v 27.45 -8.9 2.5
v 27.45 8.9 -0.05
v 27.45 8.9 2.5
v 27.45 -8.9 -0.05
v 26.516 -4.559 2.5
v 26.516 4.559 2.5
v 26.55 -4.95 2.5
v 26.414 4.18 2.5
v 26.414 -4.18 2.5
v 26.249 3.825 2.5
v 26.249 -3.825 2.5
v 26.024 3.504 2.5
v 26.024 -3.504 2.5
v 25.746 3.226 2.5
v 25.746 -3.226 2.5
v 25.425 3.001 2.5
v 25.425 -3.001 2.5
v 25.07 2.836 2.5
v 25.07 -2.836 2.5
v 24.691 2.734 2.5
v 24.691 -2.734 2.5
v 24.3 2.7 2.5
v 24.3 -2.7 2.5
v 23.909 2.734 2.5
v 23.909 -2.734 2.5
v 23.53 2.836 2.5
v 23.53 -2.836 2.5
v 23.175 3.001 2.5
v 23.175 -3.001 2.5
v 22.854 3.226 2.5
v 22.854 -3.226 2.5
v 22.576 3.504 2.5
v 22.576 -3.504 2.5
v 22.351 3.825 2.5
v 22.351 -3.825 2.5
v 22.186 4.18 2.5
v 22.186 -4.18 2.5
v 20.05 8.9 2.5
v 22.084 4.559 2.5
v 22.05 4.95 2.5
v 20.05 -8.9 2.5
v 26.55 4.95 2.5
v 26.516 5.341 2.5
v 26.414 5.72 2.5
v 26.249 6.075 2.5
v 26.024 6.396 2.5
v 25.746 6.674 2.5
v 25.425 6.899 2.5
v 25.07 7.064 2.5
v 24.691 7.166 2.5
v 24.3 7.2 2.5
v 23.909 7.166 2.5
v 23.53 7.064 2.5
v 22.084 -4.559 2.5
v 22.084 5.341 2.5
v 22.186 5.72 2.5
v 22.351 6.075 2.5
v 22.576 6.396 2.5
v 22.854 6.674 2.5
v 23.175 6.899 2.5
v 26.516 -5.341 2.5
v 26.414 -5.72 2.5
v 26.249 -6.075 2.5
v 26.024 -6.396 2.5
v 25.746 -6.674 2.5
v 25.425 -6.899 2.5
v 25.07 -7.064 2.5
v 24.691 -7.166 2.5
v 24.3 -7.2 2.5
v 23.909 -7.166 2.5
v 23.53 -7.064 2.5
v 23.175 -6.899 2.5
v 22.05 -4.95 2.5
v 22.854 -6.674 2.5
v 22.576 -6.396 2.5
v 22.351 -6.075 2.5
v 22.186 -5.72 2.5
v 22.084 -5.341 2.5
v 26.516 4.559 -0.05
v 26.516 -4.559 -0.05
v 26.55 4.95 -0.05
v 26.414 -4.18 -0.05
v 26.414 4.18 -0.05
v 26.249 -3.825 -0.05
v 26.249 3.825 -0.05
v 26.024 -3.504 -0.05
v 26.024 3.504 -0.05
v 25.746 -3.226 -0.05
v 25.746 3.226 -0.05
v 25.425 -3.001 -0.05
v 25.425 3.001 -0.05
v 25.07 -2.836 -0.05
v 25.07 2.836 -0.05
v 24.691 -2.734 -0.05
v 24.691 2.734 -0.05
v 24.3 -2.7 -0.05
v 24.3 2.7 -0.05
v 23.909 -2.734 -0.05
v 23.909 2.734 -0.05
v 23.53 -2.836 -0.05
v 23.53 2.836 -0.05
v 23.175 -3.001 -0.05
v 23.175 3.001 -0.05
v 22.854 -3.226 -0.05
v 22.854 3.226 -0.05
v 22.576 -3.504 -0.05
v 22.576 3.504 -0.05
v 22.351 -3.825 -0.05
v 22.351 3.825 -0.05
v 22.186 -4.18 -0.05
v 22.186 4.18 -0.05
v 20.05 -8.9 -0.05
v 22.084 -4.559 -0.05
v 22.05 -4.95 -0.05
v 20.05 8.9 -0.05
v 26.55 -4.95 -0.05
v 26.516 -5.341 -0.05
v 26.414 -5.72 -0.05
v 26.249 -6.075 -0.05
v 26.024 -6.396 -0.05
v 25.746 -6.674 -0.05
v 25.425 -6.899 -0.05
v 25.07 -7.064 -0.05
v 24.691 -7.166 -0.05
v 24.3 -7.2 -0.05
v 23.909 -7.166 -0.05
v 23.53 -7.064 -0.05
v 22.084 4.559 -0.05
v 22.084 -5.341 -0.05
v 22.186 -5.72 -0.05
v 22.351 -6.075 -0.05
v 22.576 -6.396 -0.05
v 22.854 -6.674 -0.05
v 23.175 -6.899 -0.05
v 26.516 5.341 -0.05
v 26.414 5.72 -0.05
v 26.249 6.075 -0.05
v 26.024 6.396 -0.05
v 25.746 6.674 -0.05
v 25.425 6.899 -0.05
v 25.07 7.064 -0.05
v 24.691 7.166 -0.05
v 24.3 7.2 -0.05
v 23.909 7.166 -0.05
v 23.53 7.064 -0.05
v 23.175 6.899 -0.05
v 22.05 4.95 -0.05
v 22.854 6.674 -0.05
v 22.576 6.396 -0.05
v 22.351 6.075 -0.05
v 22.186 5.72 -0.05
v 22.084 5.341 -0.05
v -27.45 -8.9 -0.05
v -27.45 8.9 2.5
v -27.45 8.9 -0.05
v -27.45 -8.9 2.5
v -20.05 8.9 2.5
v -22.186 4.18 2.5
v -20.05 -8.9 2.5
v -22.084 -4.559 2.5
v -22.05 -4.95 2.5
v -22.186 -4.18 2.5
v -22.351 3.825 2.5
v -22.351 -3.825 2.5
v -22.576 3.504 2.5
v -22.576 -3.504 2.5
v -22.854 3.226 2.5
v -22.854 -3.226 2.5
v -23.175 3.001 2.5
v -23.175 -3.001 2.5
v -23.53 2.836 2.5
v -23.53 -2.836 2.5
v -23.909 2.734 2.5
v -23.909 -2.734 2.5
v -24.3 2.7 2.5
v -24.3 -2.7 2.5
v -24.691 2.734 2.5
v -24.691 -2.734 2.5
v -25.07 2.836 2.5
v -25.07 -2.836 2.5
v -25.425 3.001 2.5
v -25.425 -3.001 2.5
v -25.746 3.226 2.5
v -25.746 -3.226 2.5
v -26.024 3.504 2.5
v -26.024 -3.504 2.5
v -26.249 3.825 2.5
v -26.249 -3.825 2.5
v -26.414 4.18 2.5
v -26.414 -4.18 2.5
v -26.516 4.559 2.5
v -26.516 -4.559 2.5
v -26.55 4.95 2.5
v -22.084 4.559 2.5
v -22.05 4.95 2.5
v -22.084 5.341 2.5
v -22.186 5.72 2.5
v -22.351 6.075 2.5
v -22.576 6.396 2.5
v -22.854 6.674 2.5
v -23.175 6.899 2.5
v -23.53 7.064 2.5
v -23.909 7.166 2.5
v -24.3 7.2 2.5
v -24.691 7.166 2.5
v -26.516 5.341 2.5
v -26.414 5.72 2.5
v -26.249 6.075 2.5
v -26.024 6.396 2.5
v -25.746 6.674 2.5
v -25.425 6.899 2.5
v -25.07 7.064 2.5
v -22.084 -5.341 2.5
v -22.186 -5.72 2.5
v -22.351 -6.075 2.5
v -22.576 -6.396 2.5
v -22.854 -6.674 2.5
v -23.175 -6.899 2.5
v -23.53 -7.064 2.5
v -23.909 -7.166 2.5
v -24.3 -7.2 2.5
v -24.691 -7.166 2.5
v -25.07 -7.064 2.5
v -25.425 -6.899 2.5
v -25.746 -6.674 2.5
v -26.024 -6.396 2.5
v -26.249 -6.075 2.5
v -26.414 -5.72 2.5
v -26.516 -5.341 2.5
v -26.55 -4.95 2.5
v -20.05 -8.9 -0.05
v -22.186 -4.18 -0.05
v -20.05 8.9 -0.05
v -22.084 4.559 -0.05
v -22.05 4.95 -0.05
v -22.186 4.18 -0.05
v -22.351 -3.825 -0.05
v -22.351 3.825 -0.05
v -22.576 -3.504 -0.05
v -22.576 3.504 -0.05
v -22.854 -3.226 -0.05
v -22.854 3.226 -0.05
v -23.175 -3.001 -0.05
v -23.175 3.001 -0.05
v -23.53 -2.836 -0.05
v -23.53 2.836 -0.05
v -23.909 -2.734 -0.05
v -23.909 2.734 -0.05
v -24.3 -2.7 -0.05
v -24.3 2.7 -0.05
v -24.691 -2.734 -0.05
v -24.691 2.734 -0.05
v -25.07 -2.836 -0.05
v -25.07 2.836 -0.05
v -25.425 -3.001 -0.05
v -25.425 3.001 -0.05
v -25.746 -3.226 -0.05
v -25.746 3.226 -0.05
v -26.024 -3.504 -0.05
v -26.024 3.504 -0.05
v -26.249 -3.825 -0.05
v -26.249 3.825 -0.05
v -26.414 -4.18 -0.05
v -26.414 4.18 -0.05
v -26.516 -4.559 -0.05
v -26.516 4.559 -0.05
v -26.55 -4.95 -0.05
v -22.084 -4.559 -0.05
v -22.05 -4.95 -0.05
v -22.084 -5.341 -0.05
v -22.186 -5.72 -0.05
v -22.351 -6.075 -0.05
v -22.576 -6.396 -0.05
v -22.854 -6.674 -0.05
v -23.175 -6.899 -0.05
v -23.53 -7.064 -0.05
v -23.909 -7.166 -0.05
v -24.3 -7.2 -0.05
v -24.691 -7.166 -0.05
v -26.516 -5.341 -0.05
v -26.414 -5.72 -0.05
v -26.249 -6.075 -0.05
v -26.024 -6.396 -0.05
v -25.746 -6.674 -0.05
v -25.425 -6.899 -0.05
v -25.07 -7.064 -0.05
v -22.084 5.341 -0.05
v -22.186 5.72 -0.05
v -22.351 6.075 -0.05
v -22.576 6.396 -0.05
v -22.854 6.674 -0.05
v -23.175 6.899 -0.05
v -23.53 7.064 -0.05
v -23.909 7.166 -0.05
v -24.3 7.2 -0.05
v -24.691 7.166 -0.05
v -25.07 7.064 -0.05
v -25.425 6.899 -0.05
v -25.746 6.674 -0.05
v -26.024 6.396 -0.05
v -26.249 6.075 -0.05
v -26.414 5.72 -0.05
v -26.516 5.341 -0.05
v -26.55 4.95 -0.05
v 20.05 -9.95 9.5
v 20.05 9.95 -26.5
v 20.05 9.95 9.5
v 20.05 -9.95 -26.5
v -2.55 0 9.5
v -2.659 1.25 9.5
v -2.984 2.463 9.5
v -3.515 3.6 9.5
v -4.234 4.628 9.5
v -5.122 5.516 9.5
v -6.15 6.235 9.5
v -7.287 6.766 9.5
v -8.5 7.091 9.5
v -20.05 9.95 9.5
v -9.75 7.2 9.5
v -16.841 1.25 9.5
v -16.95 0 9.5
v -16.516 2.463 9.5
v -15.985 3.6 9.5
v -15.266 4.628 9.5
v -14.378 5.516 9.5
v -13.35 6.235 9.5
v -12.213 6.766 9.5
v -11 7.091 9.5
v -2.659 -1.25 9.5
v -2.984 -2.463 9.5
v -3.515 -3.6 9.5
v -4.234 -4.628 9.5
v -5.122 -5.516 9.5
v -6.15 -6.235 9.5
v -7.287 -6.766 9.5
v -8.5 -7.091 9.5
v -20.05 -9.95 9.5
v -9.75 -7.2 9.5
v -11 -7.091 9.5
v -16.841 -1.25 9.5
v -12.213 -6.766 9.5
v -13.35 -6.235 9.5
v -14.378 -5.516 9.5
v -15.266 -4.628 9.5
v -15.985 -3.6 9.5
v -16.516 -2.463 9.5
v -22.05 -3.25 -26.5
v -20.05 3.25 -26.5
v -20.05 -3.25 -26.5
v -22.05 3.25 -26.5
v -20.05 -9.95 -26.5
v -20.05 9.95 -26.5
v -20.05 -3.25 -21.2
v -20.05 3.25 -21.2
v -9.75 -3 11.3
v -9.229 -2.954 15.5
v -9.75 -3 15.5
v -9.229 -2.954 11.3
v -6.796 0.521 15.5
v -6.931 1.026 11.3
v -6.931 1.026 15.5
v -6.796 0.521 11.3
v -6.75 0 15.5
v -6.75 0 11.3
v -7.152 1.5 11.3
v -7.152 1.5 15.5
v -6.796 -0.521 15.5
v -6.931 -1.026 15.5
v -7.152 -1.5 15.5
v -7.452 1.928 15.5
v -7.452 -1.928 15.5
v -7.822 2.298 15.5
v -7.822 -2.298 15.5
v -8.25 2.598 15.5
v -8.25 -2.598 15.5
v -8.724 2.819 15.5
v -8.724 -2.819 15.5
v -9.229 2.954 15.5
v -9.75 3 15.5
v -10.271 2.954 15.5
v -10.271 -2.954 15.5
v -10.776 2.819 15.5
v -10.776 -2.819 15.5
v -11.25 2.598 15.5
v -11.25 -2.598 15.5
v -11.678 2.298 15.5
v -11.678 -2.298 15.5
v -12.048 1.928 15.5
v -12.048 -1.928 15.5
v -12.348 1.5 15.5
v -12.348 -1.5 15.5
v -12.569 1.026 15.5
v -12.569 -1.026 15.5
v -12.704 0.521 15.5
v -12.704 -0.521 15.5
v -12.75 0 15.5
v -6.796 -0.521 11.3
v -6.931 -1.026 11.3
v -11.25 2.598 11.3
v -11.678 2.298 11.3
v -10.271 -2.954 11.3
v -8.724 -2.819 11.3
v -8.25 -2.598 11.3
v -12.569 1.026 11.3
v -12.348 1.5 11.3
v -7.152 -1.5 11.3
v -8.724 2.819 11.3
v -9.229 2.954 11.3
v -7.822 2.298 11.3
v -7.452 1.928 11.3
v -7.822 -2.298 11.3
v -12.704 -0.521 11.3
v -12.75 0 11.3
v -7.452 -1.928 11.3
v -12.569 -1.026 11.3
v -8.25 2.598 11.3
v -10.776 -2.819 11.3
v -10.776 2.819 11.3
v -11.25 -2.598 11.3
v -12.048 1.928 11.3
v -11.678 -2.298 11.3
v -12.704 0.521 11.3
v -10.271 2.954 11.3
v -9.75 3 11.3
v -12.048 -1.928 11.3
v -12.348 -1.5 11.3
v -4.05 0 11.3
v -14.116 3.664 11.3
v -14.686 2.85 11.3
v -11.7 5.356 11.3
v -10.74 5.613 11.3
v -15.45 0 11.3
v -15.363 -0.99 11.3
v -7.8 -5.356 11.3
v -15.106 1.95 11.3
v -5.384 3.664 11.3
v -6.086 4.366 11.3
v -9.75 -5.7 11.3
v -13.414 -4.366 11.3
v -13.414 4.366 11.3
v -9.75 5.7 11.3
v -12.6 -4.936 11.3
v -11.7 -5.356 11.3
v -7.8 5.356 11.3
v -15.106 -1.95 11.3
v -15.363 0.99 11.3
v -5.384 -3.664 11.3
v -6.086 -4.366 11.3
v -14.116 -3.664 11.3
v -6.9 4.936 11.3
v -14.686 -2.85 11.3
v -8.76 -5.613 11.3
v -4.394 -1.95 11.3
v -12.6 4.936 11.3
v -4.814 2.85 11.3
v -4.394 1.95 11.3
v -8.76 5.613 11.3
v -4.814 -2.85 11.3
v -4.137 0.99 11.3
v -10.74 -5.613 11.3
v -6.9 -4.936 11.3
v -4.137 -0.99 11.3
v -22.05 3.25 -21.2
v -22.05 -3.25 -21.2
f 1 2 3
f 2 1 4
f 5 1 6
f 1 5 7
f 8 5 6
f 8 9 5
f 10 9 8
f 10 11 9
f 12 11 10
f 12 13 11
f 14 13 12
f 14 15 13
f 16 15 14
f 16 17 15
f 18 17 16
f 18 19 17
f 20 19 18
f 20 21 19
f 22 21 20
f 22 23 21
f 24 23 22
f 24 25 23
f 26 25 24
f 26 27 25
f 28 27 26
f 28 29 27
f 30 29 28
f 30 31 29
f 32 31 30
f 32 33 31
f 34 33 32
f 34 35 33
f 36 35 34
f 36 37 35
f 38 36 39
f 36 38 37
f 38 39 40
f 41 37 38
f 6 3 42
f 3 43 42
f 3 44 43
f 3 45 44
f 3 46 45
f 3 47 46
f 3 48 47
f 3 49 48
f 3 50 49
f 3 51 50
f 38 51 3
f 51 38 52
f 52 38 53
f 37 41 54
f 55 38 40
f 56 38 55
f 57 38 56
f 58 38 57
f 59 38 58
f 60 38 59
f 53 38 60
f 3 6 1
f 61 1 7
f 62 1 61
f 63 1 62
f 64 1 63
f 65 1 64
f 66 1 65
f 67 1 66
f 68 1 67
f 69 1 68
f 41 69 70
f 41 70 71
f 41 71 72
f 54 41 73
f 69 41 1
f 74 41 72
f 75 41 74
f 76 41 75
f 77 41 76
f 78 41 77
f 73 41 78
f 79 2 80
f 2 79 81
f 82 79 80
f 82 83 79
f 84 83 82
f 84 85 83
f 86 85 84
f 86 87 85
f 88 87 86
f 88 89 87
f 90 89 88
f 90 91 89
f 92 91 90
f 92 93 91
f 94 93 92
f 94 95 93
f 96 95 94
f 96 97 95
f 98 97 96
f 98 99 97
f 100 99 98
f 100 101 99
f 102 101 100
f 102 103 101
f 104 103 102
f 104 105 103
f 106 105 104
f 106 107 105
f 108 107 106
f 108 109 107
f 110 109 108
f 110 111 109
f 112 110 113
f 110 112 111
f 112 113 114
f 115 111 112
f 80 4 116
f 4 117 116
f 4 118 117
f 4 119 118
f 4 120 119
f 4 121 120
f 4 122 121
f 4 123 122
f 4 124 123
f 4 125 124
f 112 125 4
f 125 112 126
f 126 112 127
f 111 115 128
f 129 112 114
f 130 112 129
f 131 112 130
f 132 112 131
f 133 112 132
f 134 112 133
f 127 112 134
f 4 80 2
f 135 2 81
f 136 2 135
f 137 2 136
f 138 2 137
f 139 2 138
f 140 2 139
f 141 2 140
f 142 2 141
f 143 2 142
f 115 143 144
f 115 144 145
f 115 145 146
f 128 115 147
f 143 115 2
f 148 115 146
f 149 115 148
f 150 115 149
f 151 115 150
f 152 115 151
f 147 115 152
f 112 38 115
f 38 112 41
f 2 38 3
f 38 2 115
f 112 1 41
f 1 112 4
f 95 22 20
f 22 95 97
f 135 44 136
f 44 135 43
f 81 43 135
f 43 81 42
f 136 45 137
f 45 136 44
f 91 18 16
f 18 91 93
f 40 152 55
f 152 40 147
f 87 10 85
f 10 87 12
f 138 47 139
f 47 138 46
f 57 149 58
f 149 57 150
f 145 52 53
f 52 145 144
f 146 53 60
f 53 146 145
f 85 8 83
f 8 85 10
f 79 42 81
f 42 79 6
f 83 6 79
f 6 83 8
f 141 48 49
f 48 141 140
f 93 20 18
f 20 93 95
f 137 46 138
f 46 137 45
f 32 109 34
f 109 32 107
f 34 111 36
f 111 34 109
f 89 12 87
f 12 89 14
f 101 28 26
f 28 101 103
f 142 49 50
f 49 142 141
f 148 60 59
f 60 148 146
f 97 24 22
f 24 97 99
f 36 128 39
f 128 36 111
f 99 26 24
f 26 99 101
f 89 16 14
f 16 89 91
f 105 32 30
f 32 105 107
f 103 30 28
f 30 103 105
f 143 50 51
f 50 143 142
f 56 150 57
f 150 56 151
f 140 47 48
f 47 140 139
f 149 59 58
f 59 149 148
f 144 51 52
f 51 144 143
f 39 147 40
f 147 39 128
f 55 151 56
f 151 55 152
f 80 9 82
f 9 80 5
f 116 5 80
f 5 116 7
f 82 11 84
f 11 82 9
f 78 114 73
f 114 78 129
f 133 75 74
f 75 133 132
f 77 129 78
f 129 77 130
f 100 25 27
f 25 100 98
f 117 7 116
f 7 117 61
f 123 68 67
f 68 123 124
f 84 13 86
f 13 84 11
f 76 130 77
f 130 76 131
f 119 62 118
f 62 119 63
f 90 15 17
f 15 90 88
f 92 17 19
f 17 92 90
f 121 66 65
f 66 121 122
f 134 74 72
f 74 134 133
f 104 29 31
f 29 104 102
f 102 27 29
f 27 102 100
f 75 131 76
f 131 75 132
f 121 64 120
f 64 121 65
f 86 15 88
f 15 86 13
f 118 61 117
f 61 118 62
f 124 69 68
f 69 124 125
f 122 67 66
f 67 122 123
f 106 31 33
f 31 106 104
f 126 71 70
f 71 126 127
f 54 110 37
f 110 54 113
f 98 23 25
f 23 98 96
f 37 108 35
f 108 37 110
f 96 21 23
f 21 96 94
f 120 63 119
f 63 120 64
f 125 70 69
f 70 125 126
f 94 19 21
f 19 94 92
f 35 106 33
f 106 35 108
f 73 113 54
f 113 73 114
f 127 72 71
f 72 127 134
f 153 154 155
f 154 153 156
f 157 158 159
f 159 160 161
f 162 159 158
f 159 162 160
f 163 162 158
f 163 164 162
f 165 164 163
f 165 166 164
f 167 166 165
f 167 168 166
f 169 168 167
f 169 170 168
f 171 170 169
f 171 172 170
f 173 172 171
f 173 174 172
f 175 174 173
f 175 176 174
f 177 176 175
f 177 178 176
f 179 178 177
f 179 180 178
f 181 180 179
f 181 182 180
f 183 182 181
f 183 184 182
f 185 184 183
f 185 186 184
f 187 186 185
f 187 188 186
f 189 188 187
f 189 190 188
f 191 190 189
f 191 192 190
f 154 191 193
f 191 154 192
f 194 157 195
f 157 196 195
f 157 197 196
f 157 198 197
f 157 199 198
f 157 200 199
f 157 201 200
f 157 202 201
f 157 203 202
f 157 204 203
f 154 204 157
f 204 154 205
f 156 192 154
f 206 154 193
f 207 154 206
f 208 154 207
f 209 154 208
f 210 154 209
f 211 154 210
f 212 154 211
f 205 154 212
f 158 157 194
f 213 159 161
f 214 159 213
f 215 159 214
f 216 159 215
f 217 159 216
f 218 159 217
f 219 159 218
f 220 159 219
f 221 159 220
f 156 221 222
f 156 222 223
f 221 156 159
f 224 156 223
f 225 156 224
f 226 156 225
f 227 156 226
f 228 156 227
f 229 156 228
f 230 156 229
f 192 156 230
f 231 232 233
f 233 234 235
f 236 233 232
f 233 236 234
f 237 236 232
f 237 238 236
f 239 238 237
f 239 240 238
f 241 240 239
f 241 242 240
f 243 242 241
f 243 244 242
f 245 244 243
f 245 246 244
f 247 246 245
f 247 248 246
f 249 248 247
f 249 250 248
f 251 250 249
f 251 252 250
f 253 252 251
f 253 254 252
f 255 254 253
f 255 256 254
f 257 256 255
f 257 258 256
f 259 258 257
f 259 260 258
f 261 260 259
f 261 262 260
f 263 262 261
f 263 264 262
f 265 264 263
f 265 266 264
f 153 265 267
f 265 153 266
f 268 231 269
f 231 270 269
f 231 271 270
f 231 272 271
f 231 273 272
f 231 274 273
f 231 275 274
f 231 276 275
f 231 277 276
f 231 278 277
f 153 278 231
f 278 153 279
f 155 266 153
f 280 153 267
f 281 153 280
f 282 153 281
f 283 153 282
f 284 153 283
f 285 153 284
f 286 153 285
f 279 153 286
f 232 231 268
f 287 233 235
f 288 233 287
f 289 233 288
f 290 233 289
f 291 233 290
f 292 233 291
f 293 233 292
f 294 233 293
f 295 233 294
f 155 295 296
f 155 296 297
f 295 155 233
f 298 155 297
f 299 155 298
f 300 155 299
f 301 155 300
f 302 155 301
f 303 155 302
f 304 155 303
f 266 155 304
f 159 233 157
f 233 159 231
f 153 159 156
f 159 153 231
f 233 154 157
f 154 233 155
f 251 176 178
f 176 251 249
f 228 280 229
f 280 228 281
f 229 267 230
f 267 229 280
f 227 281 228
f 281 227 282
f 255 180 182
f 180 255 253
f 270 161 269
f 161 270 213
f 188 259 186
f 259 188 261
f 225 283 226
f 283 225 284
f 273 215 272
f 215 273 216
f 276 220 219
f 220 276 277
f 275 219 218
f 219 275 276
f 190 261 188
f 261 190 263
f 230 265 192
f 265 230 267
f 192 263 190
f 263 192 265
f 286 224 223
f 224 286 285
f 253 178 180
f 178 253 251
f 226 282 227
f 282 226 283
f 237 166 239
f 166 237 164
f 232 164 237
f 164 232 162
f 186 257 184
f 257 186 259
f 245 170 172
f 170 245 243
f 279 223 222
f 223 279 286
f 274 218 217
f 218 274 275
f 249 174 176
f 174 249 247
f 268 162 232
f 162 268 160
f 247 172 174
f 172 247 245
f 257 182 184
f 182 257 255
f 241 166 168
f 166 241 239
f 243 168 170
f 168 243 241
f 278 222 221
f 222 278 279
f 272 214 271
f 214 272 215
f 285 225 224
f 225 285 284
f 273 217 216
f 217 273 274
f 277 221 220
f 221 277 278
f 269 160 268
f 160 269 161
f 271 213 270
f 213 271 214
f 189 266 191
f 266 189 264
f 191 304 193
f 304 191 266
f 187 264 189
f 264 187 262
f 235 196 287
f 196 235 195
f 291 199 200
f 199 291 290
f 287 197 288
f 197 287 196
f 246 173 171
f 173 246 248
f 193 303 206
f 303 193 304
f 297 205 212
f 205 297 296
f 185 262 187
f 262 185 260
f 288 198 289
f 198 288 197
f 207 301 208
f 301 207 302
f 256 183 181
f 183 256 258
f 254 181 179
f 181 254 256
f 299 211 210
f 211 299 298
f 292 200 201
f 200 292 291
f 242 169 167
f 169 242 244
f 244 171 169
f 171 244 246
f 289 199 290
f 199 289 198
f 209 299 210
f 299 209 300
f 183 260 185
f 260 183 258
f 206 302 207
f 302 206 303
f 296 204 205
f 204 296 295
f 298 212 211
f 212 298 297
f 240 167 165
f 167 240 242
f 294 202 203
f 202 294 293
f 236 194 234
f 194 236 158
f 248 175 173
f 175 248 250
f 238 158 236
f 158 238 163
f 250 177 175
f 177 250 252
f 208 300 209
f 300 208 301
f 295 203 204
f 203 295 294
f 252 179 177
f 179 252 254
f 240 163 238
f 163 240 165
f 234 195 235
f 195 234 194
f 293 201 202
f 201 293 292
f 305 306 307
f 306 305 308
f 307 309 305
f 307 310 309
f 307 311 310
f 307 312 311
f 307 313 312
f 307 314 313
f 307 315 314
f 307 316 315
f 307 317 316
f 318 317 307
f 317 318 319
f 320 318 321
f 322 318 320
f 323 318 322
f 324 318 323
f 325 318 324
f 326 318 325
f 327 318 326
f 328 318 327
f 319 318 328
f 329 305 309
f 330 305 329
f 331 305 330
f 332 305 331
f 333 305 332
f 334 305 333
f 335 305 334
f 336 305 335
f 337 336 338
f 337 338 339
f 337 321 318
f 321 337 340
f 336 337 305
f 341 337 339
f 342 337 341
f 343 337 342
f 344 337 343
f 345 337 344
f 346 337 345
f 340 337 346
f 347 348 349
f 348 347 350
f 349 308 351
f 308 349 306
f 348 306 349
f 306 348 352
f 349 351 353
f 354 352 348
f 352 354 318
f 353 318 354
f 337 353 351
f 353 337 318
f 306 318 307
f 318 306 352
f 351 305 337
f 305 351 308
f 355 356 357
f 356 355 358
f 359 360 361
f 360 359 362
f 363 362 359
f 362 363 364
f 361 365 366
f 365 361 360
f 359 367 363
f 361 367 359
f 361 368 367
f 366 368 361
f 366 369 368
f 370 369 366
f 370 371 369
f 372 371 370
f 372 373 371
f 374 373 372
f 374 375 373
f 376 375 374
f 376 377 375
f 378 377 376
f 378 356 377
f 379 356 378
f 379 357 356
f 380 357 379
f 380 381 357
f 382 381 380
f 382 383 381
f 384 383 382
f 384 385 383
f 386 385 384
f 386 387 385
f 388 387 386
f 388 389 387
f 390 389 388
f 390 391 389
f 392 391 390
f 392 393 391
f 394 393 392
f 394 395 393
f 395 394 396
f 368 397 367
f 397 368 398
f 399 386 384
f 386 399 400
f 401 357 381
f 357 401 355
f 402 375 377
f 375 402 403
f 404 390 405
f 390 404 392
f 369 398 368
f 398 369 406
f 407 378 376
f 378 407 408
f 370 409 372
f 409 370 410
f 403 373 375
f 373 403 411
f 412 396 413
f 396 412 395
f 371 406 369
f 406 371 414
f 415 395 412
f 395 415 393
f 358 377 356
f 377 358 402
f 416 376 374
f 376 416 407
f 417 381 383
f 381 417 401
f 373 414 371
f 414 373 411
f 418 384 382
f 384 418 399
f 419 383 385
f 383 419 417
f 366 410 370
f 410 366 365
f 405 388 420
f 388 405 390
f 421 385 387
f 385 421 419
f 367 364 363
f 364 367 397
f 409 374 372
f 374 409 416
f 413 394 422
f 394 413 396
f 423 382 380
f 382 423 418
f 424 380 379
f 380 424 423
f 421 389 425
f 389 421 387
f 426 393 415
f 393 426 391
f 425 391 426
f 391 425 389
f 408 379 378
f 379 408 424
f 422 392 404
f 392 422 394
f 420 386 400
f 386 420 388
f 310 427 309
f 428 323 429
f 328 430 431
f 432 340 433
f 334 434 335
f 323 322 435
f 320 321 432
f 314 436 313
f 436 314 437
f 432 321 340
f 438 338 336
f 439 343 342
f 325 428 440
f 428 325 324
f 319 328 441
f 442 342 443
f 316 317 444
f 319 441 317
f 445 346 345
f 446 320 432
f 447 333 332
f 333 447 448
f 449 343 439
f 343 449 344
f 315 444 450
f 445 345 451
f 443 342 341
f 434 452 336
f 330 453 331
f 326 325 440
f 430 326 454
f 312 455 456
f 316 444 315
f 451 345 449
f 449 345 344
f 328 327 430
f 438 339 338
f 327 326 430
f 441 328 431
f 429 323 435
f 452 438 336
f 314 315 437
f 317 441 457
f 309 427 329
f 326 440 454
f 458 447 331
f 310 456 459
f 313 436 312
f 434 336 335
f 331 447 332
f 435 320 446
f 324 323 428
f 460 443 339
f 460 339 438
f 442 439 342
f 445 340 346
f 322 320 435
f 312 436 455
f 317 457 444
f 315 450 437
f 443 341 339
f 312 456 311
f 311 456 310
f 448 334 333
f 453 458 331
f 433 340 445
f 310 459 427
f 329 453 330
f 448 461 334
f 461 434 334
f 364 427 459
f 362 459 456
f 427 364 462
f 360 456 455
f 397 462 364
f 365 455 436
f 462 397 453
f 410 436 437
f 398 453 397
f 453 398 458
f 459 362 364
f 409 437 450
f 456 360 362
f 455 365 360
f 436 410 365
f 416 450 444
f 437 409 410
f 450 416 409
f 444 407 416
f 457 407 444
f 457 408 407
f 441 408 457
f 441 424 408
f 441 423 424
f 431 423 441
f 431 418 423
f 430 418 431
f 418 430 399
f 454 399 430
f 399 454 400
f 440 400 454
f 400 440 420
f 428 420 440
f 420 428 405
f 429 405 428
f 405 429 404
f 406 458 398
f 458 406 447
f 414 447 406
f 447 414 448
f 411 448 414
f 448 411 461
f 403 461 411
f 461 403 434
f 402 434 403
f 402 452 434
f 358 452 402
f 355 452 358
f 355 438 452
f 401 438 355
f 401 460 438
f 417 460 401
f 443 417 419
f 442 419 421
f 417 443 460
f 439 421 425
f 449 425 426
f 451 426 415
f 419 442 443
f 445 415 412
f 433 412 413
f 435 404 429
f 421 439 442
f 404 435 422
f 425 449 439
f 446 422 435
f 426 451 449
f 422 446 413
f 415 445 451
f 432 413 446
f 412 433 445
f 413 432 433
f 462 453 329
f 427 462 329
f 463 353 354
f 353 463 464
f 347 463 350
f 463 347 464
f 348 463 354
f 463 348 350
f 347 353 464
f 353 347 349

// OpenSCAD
/*
Futaba S3004 servo
Aaron Ciuffo - aaron dot ciuffo 2 gmail

This library produces a fotuaba S3004 futaba servo or a projection for cutting
a hole in a 2D shape for a laser cutter.  

The scale of the projected hole for the body can be adjusted below

It can be used in other models by calling:

  import <futaba_s3004.scad>
  futaba();

The library can also produce a 2D projection that is useful for making a cutout for
a DXF to be used with a laser cutter:
  futaba(project=true)
 
To produce a projection that includes pilot holes for wood screws use:
  futaba(project, bolt=false);




V1 11 November 2014


*/
/*[Setup]*/
$fn=36; //curve refinement
scalePct=1.05; //amount to scale the projection by (to ensure a large enough hole)

/*[Body Dimensions]*/
bX=40.1;
bY=19.9;
bZ=36;

/*[Flange Dimensions and position]*/
fX=7.4;
fY=17.8;
fZ=2.55;
//flange distance from Base
flangeFromB=26.5;
fBoltDia=4.5;
fBoltRad=fBoltDia/2;
fScrewDia=2.1;
fScrewRad=fScrewDia/2;
fScrewPilot=fScrewRad*.5;

//position from edges
fScrewY=1.7;
fScrewX=0.9;
fScrewZ=7.0;

/*[Shaft Dimensions and Position]*/
shaftDia=6;
shaftRad=shaftDia/2;
shaftZ=6;
shaftX=7.3+shaftRad;
shaftS1=14.4/2;
shaftS2=11.4/2;
shaftSZ=1.8;

/*[Wire Gland]*/
wireX=2;
wireY=6.5;
wireZ=5.3;


module flange(project=false, bolt=true) {
  fHoleRad= bolt==true ? fBoltRad : fScrewPilot;
  
  if (project==false) {
    difference() {
      cube([fX, fY, fZ], center=true);
      translate([fX/2-fBoltRad-fScrewX, fY/2-fBoltRad-fScrewY, 0])
        cylinder(h=fZ*2, r=fHoleRad, center=true);
      translate([fX/2-fBoltRad-fScrewX, -fY/2+fBoltRad+fScrewY, 0])
        cylinder(h=fZ*2, r=fHoleRad, center=true);
    }
  }

  //leave the cylinders in place for projecting a bolt hole
  if (project==true) {
    translate([fX/2-fScrewRad-fScrewX, fY/2-fScrewRad-fScrewY, 0])
      cylinder(h=fZ*2, r=fScrewRad, center=true);
    translate([fX/2-fScrewRad-fScrewX, -fY/2+fScrewRad+fScrewY, 0])
      cylinder(h=fZ*2, r=fScrewRad, center=true);
  
  }

}


module body(project=false, bolt=false) {
  scalePctLoc= project==true ? scalePct : 1;
  union() {
    color("gray")
      scale(scalePctLoc) cube([bX, bY, bZ], center=true);
    color("red")
      translate([bX/2+fX/2, 0, bZ/2-fZ/2-fScrewZ])
        flange(project, bolt);
    color("red")
      translate([-bX/2-fX/2, 0, bZ/2-fZ/2-fScrewZ]) rotate([0, 0, 180])
        flange(project, bolt);
    translate([-bX/2+shaftX, 0, bZ/2]) color("blue")
      cylinder(h=shaftZ, r=shaftRad);
    translate([-bX/2+shaftX, 0, bZ/2]) color("blue")
      cylinder(h=shaftSZ, r1=shaftS1, r2=shaftS2);
    color("purple")
      translate([-bX/2-wireX/2, 0, -bZ/2+wireZ/2])
        cube([wireX, wireY, wireZ], center=true);
    }

}

module futaba(project=false, bolt=true) {
  if (project==true) {
    projection() body(project, bolt);
  } else {
    translate([0, 0, -8.5])
      body(project, bolt);
  }
 
}

futaba(project=false, bolt=true);
//futaba(project=true, bolt=false);
